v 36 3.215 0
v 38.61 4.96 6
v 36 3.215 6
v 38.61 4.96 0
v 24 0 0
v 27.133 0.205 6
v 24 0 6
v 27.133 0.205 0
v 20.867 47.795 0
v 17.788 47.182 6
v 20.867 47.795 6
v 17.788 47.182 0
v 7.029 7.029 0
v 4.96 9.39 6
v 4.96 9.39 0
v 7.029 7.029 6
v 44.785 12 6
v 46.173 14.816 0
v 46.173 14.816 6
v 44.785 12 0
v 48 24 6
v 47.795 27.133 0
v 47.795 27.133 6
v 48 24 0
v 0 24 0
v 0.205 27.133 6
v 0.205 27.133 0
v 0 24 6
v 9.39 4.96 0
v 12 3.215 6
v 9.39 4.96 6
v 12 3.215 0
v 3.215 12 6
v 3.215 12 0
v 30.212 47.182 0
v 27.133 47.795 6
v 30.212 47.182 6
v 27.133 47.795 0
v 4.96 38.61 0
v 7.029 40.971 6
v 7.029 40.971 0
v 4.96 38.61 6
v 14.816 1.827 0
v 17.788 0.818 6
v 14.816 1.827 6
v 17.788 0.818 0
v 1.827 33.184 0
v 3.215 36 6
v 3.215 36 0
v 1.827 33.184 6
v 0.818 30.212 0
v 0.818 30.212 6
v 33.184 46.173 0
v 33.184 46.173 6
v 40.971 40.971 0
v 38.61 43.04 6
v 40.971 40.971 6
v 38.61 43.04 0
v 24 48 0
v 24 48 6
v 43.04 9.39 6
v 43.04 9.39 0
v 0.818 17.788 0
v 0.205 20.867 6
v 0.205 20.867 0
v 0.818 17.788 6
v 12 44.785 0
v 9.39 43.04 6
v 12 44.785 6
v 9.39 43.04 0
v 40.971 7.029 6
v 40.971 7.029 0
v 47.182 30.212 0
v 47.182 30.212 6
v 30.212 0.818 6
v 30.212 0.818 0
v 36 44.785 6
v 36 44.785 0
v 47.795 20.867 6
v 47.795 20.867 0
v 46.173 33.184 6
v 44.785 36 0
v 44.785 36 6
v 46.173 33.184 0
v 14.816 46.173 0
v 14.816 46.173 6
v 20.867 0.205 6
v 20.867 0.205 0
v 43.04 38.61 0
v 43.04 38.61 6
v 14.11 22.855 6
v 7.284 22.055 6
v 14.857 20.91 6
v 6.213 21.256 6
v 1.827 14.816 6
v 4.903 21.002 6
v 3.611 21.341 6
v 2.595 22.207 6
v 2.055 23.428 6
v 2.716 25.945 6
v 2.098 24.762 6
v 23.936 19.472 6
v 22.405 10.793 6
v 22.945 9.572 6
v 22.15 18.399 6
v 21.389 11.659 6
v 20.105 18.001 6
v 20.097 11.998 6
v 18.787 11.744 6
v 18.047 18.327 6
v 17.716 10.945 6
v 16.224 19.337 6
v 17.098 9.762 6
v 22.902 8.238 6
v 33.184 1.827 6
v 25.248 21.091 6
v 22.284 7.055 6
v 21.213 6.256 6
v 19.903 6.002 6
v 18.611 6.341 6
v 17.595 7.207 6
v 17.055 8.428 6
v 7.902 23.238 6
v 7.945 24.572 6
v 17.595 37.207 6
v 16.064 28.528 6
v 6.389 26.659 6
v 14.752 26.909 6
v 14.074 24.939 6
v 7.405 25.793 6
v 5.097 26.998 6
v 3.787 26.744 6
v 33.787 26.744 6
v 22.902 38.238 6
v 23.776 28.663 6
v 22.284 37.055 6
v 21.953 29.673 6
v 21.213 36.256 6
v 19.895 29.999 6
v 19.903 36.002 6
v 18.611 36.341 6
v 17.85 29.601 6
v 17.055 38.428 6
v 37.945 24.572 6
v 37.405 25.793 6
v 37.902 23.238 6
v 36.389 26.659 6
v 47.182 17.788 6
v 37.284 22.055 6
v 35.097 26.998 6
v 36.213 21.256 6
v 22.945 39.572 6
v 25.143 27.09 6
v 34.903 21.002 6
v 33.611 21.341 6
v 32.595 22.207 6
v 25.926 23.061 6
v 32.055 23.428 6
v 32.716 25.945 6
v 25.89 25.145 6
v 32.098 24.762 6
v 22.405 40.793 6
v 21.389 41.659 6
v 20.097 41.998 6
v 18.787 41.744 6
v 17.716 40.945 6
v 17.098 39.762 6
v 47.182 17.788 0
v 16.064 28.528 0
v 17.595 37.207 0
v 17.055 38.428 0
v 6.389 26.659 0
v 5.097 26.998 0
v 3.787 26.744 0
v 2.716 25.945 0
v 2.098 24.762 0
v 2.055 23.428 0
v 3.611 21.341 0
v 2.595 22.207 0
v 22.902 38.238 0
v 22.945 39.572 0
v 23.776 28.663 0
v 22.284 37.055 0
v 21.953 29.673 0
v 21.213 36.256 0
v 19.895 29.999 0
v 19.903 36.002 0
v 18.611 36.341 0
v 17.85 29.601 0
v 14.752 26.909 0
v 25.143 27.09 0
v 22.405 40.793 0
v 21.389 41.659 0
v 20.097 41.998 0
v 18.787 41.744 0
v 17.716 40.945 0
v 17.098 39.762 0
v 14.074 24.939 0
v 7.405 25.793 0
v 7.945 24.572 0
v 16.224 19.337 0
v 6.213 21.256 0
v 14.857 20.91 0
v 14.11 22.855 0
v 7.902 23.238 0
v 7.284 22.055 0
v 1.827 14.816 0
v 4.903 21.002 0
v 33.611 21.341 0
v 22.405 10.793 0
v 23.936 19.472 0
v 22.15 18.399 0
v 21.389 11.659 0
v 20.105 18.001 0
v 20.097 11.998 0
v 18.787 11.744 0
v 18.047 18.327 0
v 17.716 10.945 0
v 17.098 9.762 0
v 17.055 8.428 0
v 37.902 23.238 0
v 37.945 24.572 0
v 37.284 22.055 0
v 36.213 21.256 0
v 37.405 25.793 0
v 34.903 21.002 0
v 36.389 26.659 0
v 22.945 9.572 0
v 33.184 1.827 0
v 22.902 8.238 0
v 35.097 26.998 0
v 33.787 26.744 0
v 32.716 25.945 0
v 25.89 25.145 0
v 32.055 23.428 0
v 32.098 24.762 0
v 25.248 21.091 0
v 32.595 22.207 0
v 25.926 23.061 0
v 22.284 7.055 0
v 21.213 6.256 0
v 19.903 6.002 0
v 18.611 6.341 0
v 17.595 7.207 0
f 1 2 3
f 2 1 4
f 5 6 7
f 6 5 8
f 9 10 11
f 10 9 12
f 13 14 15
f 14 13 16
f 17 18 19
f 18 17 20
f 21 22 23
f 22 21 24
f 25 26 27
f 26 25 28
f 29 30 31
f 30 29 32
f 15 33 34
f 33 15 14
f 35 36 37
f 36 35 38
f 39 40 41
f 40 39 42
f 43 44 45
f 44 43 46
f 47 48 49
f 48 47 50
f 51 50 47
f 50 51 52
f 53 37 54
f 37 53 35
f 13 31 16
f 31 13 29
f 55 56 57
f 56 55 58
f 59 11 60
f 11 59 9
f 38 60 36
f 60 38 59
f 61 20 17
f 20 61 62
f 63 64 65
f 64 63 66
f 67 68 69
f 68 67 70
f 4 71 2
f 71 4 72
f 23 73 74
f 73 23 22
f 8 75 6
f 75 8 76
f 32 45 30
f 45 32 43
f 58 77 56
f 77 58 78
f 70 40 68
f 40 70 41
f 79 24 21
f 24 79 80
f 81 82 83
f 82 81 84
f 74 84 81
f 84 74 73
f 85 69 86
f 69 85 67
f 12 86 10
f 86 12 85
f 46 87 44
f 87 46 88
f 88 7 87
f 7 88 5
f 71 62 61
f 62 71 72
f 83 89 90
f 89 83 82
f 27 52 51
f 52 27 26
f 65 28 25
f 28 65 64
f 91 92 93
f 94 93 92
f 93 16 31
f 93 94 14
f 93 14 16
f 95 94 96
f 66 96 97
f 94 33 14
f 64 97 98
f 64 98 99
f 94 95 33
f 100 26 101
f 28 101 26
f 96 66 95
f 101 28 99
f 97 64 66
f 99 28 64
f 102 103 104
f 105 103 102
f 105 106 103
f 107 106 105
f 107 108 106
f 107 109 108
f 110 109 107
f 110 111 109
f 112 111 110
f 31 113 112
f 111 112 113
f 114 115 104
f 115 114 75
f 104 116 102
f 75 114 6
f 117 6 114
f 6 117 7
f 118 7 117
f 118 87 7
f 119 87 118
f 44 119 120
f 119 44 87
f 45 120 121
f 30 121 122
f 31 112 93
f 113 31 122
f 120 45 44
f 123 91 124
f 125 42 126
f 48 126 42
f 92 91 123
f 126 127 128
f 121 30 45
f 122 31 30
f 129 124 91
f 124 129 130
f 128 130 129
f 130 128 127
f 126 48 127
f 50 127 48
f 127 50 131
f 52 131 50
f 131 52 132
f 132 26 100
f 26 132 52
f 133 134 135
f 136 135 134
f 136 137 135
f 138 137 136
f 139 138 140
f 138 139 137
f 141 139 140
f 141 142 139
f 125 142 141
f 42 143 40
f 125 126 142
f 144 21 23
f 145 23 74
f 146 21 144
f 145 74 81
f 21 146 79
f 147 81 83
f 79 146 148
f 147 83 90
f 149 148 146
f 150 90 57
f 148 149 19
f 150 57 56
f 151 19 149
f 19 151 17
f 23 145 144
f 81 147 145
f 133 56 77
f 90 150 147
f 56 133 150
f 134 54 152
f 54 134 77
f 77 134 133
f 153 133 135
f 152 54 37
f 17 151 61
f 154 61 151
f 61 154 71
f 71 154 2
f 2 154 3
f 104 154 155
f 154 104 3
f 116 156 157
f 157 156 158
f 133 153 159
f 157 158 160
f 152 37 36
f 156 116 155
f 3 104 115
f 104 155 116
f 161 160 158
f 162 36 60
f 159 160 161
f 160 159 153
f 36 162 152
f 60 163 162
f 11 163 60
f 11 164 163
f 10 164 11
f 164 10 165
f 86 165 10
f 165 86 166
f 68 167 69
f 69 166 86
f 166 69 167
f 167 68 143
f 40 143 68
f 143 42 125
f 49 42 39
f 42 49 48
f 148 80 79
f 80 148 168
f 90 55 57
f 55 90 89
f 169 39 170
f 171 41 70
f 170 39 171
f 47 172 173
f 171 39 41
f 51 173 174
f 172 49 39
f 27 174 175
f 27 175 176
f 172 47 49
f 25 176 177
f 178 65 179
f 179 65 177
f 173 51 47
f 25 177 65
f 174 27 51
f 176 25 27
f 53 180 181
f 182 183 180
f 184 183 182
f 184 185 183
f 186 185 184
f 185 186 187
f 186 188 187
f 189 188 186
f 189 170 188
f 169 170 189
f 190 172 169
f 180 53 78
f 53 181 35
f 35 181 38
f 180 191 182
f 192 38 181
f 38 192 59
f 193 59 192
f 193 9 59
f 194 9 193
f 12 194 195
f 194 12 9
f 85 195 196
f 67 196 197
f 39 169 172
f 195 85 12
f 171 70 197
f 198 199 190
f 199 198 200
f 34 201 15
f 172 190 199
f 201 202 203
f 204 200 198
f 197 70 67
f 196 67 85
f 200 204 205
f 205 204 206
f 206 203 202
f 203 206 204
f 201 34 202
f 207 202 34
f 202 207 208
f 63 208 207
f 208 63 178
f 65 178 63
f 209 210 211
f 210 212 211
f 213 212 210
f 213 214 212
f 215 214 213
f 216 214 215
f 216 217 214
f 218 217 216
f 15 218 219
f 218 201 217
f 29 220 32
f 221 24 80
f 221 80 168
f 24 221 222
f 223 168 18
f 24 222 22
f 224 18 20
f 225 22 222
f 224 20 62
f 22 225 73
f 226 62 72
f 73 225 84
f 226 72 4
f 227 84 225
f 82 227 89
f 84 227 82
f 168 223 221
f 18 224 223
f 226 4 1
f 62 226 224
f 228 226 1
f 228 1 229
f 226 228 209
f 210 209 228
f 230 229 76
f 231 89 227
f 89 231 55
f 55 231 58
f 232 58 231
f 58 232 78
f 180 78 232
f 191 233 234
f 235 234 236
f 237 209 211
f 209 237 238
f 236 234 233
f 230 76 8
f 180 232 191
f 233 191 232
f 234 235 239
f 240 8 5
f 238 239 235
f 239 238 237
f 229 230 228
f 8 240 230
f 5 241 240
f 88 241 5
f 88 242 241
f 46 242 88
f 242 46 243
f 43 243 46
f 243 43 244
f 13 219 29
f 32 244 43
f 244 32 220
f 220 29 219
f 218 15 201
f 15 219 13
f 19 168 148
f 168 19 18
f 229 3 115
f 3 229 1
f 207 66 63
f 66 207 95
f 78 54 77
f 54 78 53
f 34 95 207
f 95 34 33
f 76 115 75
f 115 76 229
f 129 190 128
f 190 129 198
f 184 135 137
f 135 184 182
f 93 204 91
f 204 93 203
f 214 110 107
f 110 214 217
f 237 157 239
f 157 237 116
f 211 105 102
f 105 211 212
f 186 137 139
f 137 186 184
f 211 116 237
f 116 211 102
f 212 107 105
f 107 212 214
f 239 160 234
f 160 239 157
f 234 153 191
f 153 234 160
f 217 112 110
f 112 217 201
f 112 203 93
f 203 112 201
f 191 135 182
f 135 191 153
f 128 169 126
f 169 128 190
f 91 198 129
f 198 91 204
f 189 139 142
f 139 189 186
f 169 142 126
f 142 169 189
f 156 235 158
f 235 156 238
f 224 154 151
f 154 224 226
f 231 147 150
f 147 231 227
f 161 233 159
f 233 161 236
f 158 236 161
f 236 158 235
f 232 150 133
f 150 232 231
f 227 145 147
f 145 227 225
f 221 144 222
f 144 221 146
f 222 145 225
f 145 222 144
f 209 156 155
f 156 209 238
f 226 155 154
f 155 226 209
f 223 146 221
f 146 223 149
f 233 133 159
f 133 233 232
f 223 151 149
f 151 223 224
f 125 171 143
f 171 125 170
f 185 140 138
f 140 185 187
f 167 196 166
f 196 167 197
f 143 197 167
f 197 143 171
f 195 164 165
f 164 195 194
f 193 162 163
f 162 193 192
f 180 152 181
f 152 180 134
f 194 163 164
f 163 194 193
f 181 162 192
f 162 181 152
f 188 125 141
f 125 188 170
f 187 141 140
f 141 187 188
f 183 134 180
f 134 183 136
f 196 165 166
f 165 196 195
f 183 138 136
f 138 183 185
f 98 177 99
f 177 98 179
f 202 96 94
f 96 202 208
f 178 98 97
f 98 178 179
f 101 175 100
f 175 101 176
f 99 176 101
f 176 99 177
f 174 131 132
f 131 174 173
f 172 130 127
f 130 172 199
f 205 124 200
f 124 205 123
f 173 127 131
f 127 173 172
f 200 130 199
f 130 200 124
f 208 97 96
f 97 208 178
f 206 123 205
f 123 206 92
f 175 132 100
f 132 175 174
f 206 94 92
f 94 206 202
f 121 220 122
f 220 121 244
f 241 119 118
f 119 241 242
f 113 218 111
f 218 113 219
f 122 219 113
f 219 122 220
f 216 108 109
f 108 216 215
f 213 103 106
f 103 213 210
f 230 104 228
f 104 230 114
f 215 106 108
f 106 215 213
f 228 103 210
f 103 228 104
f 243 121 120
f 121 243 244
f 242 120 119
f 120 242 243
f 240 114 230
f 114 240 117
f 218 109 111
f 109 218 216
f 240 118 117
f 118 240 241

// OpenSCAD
$fn = 32;

// ----------------------------------------------------------------------
// Cam plate: eccentric cam, base R24
// ----------------------------------------------------------------------

// --- parameters (mm) ---
base_r = 24;              // base circle radius
lobe_h = 10;              // cam lobe rise
bore_r = 6;               // shaft bore radius
plate_t = 6;              // plate thickness, Z (extrusion height)
ecc = 4;                  // disc eccentricity
ring_r = 15;              // lightening ring radius
bolt_r = 3;               // lightening hole radius

profile = [[48, 24], [47.795, 27.133], [47.182, 30.212], [46.173, 33.184], [44.785, 36], [43.04, 38.61], [40.971, 40.971], [38.61, 43.04], [36, 44.785], [33.184, 46.173], [30.212, 47.182], [27.133, 47.795], [24, 48], [20.867, 47.795], [17.788, 47.182], [14.816, 46.173], [12, 44.785], [9.39, 43.04], [7.029, 40.971], [4.96, 38.61], [3.215, 36], [1.827, 33.184], [0.818, 30.212], [0.205, 27.133], [0, 24], [0.205, 20.867], [0.818, 17.788], [1.827, 14.816], [3.215, 12], [4.96, 9.39], [7.029, 7.029], [9.39, 4.96], [12, 3.215], [14.816, 1.827], [17.788, 0.818], [20.867, 0.205], [24, 0], [27.133, 0.205], [30.212, 0.818], [33.184, 1.827], [36, 3.215], [38.61, 4.96], [40.971, 7.029], [43.04, 9.39], [44.785, 12], [46.173, 14.816], [47.182, 17.788], [47.795, 20.867]];  // primary outline, 48 points, counter clockwise
void_1 = [[25.89, 25.145], [25.143, 27.09], [23.776, 28.663], [21.953, 29.673], [19.895, 29.999], [17.85, 29.601], [16.064, 28.528], [14.752, 26.909], [14.074, 24.939], [14.11, 22.855], [14.857, 20.91], [16.224, 19.337], [18.047, 18.327], [20.105, 18.001], [22.15, 18.399], [23.936, 19.472], [25.248, 21.091], [25.926, 23.061]];  // shaft bore, 18 points
void_2 = [[37.945, 24.572], [37.405, 25.793], [36.389, 26.659], [35.097, 26.998], [33.787, 26.744], [32.716, 25.945], [32.098, 24.762], [32.055, 23.428], [32.595, 22.207], [33.611, 21.341], [34.903, 21.002], [36.213, 21.256], [37.284, 22.055], [37.902, 23.238]];  // lightening hole 1, 14 points
void_3 = [[22.945, 39.572], [22.405, 40.793], [21.389, 41.659], [20.097, 41.998], [18.787, 41.744], [17.716, 40.945], [17.098, 39.762], [17.055, 38.428], [17.595, 37.207], [18.611, 36.341], [19.903, 36.002], [21.213, 36.256], [22.284, 37.055], [22.902, 38.238]];  // lightening hole 2, 14 points
void_4 = [[7.945, 24.572], [7.405, 25.793], [6.389, 26.659], [5.097, 26.998], [3.787, 26.744], [2.716, 25.945], [2.098, 24.762], [2.055, 23.428], [2.595, 22.207], [3.611, 21.341], [4.903, 21.002], [6.213, 21.256], [7.284, 22.055], [7.902, 23.238]];  // lightening hole 3, 14 points
void_5 = [[22.945, 9.572], [22.405, 10.793], [21.389, 11.659], [20.097, 11.998], [18.787, 11.744], [17.716, 10.945], [17.098, 9.762], [17.055, 8.428], [17.595, 7.207], [18.611, 6.341], [19.903, 6.002], [21.213, 6.256], [22.284, 7.055], [22.902, 8.238]];  // lightening hole 4, 14 points

// --- the one profile operation ---
difference() {
  linear_extrude(height = plate_t) polygon(points = profile);
  translate([0, 0, -1])
    linear_extrude(height = plate_t + 2) polygon(points = void_1);
  translate([0, 0, -1])
    linear_extrude(height = plate_t + 2) polygon(points = void_2);
  translate([0, 0, -1])
    linear_extrude(height = plate_t + 2) polygon(points = void_3);
  translate([0, 0, -1])
    linear_extrude(height = plate_t + 2) polygon(points = void_4);
  translate([0, 0, -1])
    linear_extrude(height = plate_t + 2) polygon(points = void_5);
}
